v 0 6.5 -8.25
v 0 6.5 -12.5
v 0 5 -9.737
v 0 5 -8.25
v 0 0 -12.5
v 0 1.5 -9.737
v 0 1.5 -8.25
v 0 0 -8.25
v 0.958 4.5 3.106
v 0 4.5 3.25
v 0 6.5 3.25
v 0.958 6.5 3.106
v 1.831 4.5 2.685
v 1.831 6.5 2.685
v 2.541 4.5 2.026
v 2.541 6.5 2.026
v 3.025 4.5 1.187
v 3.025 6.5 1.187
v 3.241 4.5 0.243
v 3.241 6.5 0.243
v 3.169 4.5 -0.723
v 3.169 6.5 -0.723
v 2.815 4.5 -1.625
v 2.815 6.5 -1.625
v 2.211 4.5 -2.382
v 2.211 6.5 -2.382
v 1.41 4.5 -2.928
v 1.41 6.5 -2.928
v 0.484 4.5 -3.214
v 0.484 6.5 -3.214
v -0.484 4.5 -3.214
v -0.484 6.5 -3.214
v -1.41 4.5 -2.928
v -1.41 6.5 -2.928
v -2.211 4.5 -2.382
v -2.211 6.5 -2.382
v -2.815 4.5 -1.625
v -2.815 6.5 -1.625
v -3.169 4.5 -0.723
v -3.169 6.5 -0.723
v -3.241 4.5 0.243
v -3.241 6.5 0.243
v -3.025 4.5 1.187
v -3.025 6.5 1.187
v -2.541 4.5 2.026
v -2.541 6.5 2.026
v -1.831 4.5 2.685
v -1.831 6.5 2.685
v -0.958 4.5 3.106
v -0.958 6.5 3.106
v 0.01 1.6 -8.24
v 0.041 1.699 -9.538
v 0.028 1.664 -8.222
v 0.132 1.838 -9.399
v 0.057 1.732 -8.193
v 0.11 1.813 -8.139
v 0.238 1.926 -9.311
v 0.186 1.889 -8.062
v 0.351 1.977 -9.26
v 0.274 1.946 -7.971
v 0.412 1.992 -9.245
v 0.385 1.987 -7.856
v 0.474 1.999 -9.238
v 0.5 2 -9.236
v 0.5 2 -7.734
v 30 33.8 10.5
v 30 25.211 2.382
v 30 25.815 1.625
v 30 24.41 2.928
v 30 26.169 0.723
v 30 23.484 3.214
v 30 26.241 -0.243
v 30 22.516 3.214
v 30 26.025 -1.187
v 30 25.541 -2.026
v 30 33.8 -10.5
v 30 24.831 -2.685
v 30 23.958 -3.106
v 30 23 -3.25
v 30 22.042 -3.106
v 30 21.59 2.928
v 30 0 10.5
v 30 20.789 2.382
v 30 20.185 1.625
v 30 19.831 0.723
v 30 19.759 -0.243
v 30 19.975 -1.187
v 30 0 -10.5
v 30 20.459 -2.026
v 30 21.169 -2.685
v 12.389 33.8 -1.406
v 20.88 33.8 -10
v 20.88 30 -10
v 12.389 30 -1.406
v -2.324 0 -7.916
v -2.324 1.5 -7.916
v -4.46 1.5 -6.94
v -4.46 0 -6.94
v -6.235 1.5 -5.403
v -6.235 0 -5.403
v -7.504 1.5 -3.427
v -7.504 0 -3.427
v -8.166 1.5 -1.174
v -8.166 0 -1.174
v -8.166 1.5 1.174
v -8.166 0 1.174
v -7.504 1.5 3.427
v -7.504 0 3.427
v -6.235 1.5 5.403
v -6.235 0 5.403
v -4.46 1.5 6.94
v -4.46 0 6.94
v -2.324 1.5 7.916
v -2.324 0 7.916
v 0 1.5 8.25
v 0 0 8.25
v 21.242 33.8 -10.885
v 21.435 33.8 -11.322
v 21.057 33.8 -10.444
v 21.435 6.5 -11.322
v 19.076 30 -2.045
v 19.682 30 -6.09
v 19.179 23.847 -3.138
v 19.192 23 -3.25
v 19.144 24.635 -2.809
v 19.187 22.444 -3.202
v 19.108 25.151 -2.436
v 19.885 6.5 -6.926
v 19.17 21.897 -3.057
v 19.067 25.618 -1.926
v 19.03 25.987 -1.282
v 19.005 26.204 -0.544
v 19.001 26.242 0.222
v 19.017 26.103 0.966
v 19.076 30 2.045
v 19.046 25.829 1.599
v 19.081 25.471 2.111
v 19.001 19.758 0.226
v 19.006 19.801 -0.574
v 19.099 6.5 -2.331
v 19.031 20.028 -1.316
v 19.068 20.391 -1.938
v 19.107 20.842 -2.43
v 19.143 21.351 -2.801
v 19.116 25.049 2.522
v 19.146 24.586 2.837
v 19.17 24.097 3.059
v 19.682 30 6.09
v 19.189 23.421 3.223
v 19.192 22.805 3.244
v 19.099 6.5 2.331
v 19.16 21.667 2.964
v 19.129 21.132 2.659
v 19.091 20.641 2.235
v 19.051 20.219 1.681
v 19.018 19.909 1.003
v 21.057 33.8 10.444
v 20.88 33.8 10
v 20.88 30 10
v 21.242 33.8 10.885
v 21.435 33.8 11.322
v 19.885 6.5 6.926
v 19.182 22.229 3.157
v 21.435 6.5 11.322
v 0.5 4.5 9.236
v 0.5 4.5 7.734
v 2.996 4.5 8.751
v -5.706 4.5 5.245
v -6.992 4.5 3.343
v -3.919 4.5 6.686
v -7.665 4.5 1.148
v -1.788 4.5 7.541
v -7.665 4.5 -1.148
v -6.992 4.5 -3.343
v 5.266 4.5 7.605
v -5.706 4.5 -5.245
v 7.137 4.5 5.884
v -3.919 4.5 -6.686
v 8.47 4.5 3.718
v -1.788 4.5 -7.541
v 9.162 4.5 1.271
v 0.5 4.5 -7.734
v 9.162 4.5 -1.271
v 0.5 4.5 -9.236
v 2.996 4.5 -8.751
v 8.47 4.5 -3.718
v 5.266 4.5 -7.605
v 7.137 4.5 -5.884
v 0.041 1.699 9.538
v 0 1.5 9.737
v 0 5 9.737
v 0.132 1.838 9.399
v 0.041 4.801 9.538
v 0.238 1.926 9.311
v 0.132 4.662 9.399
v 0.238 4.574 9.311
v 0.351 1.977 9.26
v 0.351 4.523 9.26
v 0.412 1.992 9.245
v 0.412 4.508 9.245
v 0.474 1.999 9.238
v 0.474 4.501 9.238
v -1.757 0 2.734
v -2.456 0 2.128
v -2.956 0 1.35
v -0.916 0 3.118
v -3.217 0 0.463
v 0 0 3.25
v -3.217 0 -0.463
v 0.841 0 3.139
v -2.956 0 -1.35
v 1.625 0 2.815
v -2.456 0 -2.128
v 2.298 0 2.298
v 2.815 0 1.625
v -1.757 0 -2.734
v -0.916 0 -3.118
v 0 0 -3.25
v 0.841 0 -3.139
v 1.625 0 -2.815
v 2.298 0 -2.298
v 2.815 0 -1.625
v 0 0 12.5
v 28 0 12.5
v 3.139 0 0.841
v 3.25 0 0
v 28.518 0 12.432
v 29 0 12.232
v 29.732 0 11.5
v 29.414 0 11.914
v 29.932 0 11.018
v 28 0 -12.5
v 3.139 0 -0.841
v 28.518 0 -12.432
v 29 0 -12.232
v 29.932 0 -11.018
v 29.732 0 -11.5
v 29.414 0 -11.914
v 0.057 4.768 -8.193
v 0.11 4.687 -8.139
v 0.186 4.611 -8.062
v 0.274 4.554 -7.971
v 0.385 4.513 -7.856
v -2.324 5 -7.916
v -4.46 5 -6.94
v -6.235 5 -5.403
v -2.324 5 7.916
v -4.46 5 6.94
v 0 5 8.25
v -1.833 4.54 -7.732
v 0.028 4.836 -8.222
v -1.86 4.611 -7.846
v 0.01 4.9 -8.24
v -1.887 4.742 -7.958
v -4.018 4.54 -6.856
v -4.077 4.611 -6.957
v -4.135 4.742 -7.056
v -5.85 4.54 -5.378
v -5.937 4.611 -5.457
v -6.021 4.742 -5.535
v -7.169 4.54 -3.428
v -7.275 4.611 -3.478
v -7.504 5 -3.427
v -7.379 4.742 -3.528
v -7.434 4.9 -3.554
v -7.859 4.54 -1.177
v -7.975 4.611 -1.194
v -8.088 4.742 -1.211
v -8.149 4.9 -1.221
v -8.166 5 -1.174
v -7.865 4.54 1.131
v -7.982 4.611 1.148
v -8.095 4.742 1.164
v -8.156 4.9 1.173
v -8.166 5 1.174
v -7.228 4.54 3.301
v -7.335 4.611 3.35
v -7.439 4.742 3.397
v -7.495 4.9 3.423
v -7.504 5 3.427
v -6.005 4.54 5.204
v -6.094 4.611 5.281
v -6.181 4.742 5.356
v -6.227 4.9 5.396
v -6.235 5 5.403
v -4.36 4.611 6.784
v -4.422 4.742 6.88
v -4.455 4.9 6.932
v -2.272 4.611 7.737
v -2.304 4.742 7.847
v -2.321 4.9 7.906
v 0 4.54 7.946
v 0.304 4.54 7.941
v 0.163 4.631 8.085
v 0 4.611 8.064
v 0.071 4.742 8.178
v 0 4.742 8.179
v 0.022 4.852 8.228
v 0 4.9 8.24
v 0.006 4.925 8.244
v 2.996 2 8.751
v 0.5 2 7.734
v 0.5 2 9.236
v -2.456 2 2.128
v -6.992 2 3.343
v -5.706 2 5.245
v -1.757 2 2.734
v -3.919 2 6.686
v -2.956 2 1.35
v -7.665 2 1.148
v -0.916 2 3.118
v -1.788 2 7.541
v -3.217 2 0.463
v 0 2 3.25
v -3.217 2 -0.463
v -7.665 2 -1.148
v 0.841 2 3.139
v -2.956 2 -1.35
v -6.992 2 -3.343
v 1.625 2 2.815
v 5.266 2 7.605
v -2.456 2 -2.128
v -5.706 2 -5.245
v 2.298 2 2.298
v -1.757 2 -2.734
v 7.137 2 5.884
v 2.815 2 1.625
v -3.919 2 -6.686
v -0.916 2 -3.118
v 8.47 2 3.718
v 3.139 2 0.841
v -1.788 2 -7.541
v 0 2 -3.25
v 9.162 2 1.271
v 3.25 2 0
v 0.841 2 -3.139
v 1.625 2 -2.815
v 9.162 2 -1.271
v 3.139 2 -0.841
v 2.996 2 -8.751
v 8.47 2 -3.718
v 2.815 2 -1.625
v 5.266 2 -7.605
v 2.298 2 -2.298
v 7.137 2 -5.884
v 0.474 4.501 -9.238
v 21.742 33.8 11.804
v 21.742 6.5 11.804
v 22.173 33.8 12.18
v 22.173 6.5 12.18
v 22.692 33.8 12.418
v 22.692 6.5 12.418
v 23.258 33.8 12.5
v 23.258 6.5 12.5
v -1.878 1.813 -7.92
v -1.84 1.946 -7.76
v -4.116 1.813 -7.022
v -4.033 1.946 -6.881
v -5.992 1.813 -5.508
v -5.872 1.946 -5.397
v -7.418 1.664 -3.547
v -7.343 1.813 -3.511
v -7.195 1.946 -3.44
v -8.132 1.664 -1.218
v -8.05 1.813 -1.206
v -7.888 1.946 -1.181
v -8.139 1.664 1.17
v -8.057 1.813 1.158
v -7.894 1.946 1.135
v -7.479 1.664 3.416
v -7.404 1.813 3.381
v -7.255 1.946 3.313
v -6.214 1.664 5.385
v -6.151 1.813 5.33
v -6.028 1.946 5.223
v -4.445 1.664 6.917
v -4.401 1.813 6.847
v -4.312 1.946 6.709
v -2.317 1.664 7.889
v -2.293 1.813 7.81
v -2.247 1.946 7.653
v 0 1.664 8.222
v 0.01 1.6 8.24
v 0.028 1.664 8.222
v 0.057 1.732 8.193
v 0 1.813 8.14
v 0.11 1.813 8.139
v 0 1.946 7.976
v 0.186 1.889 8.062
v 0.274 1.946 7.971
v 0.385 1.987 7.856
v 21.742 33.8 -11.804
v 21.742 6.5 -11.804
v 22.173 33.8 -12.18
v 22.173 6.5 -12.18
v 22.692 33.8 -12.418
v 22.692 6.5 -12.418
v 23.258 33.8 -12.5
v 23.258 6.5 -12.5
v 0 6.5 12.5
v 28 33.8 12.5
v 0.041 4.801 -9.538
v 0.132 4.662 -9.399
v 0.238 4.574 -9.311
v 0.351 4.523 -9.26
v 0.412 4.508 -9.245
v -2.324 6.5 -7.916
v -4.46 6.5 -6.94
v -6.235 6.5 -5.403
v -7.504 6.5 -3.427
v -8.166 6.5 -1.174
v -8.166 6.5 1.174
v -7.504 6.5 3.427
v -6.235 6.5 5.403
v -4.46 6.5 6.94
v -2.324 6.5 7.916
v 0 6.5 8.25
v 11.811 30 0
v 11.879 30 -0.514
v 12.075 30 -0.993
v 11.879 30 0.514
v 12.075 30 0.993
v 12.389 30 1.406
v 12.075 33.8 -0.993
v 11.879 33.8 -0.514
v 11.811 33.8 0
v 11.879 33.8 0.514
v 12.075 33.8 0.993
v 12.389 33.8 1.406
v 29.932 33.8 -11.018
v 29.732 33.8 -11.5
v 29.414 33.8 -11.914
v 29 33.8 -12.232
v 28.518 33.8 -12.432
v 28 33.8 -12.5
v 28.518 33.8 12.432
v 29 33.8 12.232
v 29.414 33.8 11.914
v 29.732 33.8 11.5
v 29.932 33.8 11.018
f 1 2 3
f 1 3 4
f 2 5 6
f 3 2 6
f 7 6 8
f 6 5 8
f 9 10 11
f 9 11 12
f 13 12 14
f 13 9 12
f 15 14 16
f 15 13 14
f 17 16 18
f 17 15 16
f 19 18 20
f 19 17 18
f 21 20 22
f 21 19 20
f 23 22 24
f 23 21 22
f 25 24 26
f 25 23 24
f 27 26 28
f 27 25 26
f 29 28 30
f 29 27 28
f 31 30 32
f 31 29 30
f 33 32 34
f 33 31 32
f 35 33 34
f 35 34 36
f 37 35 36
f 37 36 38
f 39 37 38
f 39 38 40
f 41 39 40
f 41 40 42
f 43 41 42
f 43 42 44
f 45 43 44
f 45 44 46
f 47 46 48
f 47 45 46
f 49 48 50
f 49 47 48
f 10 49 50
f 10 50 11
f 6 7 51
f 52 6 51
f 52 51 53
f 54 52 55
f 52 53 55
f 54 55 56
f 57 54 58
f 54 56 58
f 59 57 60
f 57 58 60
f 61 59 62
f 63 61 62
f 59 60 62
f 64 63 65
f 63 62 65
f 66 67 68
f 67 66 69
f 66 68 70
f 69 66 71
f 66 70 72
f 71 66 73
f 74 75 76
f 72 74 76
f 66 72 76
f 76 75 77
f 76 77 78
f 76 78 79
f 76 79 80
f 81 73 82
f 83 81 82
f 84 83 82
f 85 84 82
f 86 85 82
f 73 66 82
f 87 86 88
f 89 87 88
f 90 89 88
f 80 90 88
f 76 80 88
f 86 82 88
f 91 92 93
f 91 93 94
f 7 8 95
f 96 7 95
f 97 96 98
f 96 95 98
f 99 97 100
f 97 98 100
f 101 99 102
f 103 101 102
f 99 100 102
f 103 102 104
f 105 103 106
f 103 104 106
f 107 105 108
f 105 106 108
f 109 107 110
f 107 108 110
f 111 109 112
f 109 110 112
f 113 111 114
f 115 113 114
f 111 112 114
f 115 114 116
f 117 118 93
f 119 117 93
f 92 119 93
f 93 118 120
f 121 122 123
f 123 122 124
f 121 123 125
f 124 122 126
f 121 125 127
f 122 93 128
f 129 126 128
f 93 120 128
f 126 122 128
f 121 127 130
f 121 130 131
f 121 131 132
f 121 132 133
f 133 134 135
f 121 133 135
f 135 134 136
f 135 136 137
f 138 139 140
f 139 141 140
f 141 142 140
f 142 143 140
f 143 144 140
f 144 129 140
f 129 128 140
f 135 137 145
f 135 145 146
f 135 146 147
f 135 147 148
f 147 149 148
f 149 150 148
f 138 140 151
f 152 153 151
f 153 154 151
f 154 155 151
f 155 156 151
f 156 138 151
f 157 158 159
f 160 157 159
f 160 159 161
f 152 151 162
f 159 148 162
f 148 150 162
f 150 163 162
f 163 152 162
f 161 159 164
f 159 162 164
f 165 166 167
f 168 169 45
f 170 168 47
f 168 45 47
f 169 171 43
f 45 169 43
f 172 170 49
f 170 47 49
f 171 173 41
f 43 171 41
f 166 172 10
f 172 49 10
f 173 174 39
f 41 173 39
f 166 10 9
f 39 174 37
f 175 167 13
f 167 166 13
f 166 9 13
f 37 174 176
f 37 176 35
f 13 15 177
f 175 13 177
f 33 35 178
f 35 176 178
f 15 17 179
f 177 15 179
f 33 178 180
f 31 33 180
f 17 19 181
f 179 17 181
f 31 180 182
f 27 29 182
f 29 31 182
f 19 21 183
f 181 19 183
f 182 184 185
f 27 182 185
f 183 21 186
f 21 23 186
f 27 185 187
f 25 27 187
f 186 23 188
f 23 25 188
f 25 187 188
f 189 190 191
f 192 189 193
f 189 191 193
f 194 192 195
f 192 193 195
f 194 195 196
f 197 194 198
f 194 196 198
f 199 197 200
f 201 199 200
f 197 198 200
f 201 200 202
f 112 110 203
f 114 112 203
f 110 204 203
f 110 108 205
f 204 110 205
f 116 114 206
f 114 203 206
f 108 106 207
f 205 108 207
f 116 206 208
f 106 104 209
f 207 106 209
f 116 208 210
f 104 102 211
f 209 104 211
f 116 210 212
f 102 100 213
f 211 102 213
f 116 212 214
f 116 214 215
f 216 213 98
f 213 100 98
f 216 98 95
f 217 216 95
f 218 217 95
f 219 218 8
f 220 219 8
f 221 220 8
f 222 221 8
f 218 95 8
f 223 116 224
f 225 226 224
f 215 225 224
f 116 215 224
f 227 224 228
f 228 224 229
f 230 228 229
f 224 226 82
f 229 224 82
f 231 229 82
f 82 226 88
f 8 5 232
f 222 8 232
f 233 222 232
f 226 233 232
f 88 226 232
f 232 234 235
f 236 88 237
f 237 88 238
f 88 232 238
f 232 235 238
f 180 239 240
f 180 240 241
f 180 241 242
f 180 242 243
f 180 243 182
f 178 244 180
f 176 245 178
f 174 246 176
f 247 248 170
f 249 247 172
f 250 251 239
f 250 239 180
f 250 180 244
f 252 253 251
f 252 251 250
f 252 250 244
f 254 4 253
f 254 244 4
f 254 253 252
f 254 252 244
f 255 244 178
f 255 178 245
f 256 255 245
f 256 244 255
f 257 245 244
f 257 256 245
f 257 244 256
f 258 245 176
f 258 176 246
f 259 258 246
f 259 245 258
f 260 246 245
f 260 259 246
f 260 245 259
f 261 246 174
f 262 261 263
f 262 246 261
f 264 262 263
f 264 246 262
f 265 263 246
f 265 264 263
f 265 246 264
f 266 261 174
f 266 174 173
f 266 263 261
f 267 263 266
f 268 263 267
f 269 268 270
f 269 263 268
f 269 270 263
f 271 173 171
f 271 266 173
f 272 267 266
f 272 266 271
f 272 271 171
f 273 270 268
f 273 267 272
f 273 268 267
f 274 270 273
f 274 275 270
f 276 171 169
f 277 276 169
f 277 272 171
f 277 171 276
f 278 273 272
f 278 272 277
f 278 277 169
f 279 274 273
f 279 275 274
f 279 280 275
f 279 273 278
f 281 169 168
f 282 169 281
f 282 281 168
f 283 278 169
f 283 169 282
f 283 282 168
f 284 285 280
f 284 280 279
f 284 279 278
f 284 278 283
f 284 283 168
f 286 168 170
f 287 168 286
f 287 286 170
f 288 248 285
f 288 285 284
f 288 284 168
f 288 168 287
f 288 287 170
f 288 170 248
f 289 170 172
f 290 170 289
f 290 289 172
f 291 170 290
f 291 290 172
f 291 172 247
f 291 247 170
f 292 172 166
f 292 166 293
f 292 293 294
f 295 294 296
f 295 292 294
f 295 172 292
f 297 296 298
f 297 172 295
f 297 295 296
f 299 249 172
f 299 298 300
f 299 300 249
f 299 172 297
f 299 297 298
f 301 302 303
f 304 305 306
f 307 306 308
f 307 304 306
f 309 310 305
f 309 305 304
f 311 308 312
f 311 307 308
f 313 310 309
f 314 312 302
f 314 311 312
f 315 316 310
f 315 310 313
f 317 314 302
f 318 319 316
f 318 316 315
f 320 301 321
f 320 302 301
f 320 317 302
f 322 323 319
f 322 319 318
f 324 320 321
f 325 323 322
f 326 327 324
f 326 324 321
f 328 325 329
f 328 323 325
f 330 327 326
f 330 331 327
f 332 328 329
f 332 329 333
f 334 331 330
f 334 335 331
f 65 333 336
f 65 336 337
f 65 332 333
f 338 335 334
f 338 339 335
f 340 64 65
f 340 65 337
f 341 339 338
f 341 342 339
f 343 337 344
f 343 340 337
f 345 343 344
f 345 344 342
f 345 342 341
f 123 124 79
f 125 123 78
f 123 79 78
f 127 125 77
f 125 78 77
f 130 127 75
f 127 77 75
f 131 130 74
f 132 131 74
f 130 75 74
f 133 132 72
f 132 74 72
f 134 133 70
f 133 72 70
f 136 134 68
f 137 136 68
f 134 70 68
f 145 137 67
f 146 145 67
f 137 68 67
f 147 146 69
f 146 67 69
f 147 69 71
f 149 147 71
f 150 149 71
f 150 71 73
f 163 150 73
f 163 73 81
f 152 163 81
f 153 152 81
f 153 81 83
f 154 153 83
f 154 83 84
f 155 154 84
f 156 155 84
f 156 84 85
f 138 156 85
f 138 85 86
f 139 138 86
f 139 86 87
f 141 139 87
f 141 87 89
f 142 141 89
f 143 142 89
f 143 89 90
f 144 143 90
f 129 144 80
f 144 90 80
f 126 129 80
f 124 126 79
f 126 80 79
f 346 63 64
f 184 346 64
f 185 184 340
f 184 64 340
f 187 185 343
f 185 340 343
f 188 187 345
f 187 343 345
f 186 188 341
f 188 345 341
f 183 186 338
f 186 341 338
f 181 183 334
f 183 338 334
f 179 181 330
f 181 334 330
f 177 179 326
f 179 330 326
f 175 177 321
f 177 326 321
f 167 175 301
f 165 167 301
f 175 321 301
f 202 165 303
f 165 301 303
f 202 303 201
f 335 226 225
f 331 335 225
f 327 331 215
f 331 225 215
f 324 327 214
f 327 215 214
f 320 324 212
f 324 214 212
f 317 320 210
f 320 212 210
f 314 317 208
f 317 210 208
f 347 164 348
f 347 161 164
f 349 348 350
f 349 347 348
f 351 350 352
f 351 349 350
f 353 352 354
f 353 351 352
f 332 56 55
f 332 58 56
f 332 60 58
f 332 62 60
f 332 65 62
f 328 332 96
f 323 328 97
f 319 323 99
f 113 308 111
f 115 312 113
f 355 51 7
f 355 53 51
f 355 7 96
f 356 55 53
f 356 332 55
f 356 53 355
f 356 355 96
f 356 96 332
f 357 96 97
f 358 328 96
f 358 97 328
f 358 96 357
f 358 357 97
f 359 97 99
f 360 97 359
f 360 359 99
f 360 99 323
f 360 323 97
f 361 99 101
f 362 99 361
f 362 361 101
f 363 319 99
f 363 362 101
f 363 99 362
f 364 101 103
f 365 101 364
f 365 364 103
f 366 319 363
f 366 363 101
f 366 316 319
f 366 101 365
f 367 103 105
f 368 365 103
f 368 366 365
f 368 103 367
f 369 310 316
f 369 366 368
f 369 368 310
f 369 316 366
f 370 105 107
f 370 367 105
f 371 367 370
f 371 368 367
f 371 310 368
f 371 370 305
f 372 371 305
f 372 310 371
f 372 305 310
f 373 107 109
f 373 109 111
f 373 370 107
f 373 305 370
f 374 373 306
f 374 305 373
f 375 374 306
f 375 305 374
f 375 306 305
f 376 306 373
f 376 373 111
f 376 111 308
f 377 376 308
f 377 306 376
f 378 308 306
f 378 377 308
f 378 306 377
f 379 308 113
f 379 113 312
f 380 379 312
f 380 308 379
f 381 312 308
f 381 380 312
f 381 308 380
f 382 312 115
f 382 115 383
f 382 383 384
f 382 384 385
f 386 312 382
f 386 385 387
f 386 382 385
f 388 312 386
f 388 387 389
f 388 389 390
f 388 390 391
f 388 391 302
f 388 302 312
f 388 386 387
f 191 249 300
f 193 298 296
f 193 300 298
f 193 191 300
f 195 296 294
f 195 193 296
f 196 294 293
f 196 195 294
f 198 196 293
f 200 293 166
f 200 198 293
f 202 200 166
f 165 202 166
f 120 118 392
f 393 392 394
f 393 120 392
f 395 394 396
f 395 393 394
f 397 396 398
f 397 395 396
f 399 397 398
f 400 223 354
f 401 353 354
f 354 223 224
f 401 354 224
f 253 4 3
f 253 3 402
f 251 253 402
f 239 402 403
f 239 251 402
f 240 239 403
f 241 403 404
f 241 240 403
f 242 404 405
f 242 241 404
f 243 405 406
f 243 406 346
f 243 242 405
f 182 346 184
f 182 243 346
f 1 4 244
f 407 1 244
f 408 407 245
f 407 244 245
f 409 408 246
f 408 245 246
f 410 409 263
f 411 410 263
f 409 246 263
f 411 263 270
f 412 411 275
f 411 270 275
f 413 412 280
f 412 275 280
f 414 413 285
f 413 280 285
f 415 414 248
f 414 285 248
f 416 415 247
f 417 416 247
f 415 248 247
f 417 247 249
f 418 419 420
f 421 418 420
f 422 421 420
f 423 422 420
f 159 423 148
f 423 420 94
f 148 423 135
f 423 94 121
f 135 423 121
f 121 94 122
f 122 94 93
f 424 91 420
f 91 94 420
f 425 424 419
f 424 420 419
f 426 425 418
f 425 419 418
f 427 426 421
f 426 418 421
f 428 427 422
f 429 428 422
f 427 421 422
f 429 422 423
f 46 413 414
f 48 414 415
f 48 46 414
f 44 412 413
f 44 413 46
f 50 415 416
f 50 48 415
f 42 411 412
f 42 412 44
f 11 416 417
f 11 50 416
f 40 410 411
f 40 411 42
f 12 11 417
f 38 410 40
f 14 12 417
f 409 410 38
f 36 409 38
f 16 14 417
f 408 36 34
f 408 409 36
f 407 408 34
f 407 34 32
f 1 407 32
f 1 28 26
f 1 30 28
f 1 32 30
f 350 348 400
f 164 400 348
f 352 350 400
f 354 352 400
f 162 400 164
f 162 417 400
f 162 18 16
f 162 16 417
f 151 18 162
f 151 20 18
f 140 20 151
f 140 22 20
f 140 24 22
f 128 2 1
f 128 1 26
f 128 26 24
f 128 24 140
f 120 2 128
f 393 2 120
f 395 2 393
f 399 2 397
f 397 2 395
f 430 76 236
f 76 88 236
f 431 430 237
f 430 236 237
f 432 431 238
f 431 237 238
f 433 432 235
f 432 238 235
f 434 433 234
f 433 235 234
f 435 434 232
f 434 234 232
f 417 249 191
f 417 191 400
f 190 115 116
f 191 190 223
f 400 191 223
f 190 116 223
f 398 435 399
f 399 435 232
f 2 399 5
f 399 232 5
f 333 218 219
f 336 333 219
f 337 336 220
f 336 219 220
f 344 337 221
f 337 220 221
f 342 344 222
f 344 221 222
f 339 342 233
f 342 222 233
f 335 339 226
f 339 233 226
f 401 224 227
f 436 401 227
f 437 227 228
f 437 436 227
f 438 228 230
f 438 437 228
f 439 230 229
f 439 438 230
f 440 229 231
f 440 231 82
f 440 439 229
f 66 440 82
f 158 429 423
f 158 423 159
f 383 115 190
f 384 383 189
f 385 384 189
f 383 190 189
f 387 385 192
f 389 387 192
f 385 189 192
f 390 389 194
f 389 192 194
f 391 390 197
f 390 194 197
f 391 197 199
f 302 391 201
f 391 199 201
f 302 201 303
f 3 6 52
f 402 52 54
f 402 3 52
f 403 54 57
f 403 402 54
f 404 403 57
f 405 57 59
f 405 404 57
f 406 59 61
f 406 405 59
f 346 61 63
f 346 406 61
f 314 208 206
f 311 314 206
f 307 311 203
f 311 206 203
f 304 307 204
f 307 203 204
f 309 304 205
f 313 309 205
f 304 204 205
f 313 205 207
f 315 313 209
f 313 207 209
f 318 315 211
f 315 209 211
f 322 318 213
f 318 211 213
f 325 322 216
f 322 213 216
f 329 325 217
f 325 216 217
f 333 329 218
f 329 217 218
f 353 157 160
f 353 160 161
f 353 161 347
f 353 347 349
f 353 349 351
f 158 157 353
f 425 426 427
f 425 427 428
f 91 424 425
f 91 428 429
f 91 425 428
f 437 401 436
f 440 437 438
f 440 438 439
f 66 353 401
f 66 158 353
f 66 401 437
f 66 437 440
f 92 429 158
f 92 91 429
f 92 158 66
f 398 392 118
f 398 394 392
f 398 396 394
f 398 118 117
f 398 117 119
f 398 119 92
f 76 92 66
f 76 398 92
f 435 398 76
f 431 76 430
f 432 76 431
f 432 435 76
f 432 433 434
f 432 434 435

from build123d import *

# Parameters (mm, degrees)
BOSS_EXTRUDE1_DEPTH     = 2
BOSS_EXTRUDE2_START     = 2
BOSS_EXTRUDE2_DEPTH     = 2.5
BOSS_EXTRUDE3_START     = 4.5
SKETCH1_6_R             = 3.25
BOSS_EXTRUDE3_DEPTH     = 2
BOSS_EXTRUDE6_DEPTH     = 33.8
BOSS_EXTRUDE7_DEPTH     = 3.8
FILLET1_R               = 2
FILLET2_R               = 2
FILLET3_R               = 0.5
CUT_EXTRUDE1_REACH      = 54.552
CUT_EXTRUDE1_END_RADIUS = 27.541666667
SKETCH6_R               = 3.25


with BuildPart() as part:
    # Sketch1 → Boss-Extrude1 (new body)
    with BuildSketch(Plane(origin=(0, 0, 0), x_dir=(1, 0, 0), z_dir=(0, 1, 0))):
        with BuildLine():
            ThreePointArc((0, 8.25), (-8.25, 0), (0, -8.25))
            Line((0, -8.25), (0, -3.25))
            ThreePointArc((0, -3.25), (-3.25, 0), (0, 3.25))
            Line((0, 3.25), (0, 8.25))
        make_face()
        with BuildLine():
            Line((0, -3.25), (0, -8.25))
            ThreePointArc((0, -8.25), (5.833630945, -5.833630945), (8.25, 0))
            ThreePointArc((8.25, 0), (5.833630945, 5.833630945), (0, 8.25))
            Line((0, 8.25), (0, 3.25))
            ThreePointArc((0, 3.25), (2.298097039, 2.298097039), (3.25, 0))
            ThreePointArc((3.25, 0), (2.298097039, -2.298097039), (0, -3.25))
        make_face()
        with BuildLine():
            Line((0, -8.25), (0, -9.25))
            ThreePointArc((0, -9.25), (9.25, 0), (0, 9.25))
            Line((0, 9.25), (0, 8.25))
            ThreePointArc((0, 8.25), (5.833630945, 5.833630945), (8.25, 0))
            ThreePointArc((8.25, 0), (5.833630945, -5.833630945), (0, -8.25))
        make_face()
        with BuildLine():
            Line((0, -12.5), (22, -12.5))
            ThreePointArc((22, -12.5), (19, 0), (22, 12.5))
            Line((22, 12.5), (0, 12.5))
            Line((0, 12.5), (0, 9.25))
            ThreePointArc((0, 9.25), (9.25, 0), (0, -9.25))
            Line((0, -9.25), (0, -12.5))
        make_face()
        with BuildLine():
            Line((22, -12.5), (30, -12.5))
            Line((30, -12.5), (30, 12.5))
            Line((30, 12.5), (22, 12.5))
            ThreePointArc((22, 12.5), (19, 0), (22, -12.5))
        make_face()
    extrude(amount=BOSS_EXTRUDE1_DEPTH)

    # Sketch1<4> → Boss-Extrude2 (add)
    with BuildSketch(Plane(origin=(0, 0, 0), x_dir=(1, 0, 0), z_dir=(0, 1, 0)).offset(BOSS_EXTRUDE2_START)):
        with BuildLine():
            Line((30, -12.5), (30, 12.5))
            Line((30, 12.5), (0, 12.5))
            Line((0, 12.5), (0, 9.25))
            ThreePointArc((0, 9.25), (9.25, 0), (0, -9.25))
            Line((0, -9.25), (0, -12.5))
            Line((0, -12.5), (30, -12.5))
        make_face()
    extrude(amount=BOSS_EXTRUDE2_DEPTH)

    # Sketch1<6> → Boss-Extrude3 (add)
    with BuildSketch(Plane(origin=(0, 0, 0), x_dir=(1, 0, 0), z_dir=(0, 1, 0)).offset(BOSS_EXTRUDE3_START)):
        with BuildLine():
            Line((30, -12.5), (30, 12.5))
            Line((30, 12.5), (0, 12.5))
            Line((0, 12.5), (0, 8.25))
            ThreePointArc((0, 8.25), (-8.25, 0), (0, -8.25))
            Line((0, -8.25), (0, -12.5))
            Line((0, -12.5), (30, -12.5))
        make_face()
        with Locations(Location((0, 0, 0), (0, 0, 270))):
            Circle(SKETCH1_6_R, mode=Mode.SUBTRACT)
    extrude(amount=BOSS_EXTRUDE3_DEPTH)

    # Sketch1<8> → Boss-Extrude6 (add)
    with BuildSketch(Plane(origin=(0, 0, 0), x_dir=(1, 0, 0), z_dir=(0, 1, 0))):
        with BuildLine():
            Line((22, -12.5), (30, -12.5))
            Line((30, -12.5), (30, 12.5))
            Line((30, 12.5), (22, 12.5))
            ThreePointArc((22, 12.5), (19, 0), (22, -12.5))
        make_face()
    extrude(amount=BOSS_EXTRUDE6_DEPTH)

    # Sketch3 → Boss-Extrude7 (add)
    with BuildSketch(Plane(origin=(0, 33.8, 0), x_dir=(1, 0, 0), z_dir=(0, 1, 0))):
        with BuildLine():
            Line((11, 0), (19, 0))
            ThreePointArc((19, 0), (19.473969858, 5.087552676), (20.879566153, 10))
            Line((20.879566153, 10), (11, 0))
        make_face()
        with BuildLine():
            ThreePointArc((20.879566153, -10), (19.473969858, -5.087552676), (19, 0))
            Line((19, 0), (11, 0))
            Line((11, 0), (20.879566153, -10))
        make_face()
        with BuildLine():
            ThreePointArc((20.879566153, 10), (19.473969858, 5.087552676), (19, 0))
            ThreePointArc((19, 0), (19.473969858, -5.087552676), (20.879566153, -10))
            ThreePointArc((20.879566153, -10), (21.408679185, -11.263939941), (22, -12.5))
            Line((22, -12.5), (30, -12.5))
            Line((30, -12.5), (30, 12.5))
            Line((30, 12.5), (22, 12.5))
            ThreePointArc((22, 12.5), (21.408679185, 11.263939941), (20.879566153, 10))
        make_face()
    extrude(amount=-BOSS_EXTRUDE7_DEPTH)

    # Fillet1
    fillet1_edges = [part.edges().sort_by_distance(p)[0] for p in [
        (11, 31.9, 0),
    ]]
    fillet(fillet1_edges, radius=FILLET1_R)

    # Fillet2
    fillet2_edges = [part.edges().sort_by_distance(p)[0] for p in [
        (30, 16.9, -12.5),
        (30, 16.9, 12.5),
        (22, 20.15, -12.5),
        (22, 20.15, 12.5),
    ]]
    fillet(fillet2_edges, radius=FILLET2_R)

    # Fillet3
    fillet3_edges = [part.edges().sort_by_distance(p)[0] for p in [
        (0, 2, 8.75),
        (0, 3.25, -9.25),
        (0, 3.25, 9.25),
        (0, 2, -8.75),
        (0, 4.5, -8.75),
        (-8.25, 4.5, 0),
        (0, 4.5, 8.75),
        (-8.25, 2, 0),
    ]]
    fillet(fillet3_edges, radius=FILLET3_R)

    # Cut-Extrude1: up to this cylinder (the profile starts inside it)
    cut_extrude1_end = Plane(origin=(46.541666667, 23, 0), z_dir=(0, -1, 0)) * Cylinder(CUT_EXTRUDE1_END_RADIUS, 165.187333333, mode=Mode.PRIVATE)
    # Sketch6 → Cut-Extrude1 (cut, up to the surface)
    with BuildSketch(Plane(origin=(30, 0, 0), x_dir=(0, 0, -1), z_dir=(1, 0, 0)), mode=Mode.PRIVATE) as cut_extrude1_sk1:
        with Locations((0, 23)):
            Circle(SKETCH6_R)
    cut_extrude1_tool1 = extrude(cut_extrude1_sk1.sketch, amount=-CUT_EXTRUDE1_REACH, mode=Mode.PRIVATE) & cut_extrude1_end
    add(cut_extrude1_tool1.solids().sort_by_distance((30, 23, 0))[0], mode=Mode.SUBTRACT)


solid = part.part
